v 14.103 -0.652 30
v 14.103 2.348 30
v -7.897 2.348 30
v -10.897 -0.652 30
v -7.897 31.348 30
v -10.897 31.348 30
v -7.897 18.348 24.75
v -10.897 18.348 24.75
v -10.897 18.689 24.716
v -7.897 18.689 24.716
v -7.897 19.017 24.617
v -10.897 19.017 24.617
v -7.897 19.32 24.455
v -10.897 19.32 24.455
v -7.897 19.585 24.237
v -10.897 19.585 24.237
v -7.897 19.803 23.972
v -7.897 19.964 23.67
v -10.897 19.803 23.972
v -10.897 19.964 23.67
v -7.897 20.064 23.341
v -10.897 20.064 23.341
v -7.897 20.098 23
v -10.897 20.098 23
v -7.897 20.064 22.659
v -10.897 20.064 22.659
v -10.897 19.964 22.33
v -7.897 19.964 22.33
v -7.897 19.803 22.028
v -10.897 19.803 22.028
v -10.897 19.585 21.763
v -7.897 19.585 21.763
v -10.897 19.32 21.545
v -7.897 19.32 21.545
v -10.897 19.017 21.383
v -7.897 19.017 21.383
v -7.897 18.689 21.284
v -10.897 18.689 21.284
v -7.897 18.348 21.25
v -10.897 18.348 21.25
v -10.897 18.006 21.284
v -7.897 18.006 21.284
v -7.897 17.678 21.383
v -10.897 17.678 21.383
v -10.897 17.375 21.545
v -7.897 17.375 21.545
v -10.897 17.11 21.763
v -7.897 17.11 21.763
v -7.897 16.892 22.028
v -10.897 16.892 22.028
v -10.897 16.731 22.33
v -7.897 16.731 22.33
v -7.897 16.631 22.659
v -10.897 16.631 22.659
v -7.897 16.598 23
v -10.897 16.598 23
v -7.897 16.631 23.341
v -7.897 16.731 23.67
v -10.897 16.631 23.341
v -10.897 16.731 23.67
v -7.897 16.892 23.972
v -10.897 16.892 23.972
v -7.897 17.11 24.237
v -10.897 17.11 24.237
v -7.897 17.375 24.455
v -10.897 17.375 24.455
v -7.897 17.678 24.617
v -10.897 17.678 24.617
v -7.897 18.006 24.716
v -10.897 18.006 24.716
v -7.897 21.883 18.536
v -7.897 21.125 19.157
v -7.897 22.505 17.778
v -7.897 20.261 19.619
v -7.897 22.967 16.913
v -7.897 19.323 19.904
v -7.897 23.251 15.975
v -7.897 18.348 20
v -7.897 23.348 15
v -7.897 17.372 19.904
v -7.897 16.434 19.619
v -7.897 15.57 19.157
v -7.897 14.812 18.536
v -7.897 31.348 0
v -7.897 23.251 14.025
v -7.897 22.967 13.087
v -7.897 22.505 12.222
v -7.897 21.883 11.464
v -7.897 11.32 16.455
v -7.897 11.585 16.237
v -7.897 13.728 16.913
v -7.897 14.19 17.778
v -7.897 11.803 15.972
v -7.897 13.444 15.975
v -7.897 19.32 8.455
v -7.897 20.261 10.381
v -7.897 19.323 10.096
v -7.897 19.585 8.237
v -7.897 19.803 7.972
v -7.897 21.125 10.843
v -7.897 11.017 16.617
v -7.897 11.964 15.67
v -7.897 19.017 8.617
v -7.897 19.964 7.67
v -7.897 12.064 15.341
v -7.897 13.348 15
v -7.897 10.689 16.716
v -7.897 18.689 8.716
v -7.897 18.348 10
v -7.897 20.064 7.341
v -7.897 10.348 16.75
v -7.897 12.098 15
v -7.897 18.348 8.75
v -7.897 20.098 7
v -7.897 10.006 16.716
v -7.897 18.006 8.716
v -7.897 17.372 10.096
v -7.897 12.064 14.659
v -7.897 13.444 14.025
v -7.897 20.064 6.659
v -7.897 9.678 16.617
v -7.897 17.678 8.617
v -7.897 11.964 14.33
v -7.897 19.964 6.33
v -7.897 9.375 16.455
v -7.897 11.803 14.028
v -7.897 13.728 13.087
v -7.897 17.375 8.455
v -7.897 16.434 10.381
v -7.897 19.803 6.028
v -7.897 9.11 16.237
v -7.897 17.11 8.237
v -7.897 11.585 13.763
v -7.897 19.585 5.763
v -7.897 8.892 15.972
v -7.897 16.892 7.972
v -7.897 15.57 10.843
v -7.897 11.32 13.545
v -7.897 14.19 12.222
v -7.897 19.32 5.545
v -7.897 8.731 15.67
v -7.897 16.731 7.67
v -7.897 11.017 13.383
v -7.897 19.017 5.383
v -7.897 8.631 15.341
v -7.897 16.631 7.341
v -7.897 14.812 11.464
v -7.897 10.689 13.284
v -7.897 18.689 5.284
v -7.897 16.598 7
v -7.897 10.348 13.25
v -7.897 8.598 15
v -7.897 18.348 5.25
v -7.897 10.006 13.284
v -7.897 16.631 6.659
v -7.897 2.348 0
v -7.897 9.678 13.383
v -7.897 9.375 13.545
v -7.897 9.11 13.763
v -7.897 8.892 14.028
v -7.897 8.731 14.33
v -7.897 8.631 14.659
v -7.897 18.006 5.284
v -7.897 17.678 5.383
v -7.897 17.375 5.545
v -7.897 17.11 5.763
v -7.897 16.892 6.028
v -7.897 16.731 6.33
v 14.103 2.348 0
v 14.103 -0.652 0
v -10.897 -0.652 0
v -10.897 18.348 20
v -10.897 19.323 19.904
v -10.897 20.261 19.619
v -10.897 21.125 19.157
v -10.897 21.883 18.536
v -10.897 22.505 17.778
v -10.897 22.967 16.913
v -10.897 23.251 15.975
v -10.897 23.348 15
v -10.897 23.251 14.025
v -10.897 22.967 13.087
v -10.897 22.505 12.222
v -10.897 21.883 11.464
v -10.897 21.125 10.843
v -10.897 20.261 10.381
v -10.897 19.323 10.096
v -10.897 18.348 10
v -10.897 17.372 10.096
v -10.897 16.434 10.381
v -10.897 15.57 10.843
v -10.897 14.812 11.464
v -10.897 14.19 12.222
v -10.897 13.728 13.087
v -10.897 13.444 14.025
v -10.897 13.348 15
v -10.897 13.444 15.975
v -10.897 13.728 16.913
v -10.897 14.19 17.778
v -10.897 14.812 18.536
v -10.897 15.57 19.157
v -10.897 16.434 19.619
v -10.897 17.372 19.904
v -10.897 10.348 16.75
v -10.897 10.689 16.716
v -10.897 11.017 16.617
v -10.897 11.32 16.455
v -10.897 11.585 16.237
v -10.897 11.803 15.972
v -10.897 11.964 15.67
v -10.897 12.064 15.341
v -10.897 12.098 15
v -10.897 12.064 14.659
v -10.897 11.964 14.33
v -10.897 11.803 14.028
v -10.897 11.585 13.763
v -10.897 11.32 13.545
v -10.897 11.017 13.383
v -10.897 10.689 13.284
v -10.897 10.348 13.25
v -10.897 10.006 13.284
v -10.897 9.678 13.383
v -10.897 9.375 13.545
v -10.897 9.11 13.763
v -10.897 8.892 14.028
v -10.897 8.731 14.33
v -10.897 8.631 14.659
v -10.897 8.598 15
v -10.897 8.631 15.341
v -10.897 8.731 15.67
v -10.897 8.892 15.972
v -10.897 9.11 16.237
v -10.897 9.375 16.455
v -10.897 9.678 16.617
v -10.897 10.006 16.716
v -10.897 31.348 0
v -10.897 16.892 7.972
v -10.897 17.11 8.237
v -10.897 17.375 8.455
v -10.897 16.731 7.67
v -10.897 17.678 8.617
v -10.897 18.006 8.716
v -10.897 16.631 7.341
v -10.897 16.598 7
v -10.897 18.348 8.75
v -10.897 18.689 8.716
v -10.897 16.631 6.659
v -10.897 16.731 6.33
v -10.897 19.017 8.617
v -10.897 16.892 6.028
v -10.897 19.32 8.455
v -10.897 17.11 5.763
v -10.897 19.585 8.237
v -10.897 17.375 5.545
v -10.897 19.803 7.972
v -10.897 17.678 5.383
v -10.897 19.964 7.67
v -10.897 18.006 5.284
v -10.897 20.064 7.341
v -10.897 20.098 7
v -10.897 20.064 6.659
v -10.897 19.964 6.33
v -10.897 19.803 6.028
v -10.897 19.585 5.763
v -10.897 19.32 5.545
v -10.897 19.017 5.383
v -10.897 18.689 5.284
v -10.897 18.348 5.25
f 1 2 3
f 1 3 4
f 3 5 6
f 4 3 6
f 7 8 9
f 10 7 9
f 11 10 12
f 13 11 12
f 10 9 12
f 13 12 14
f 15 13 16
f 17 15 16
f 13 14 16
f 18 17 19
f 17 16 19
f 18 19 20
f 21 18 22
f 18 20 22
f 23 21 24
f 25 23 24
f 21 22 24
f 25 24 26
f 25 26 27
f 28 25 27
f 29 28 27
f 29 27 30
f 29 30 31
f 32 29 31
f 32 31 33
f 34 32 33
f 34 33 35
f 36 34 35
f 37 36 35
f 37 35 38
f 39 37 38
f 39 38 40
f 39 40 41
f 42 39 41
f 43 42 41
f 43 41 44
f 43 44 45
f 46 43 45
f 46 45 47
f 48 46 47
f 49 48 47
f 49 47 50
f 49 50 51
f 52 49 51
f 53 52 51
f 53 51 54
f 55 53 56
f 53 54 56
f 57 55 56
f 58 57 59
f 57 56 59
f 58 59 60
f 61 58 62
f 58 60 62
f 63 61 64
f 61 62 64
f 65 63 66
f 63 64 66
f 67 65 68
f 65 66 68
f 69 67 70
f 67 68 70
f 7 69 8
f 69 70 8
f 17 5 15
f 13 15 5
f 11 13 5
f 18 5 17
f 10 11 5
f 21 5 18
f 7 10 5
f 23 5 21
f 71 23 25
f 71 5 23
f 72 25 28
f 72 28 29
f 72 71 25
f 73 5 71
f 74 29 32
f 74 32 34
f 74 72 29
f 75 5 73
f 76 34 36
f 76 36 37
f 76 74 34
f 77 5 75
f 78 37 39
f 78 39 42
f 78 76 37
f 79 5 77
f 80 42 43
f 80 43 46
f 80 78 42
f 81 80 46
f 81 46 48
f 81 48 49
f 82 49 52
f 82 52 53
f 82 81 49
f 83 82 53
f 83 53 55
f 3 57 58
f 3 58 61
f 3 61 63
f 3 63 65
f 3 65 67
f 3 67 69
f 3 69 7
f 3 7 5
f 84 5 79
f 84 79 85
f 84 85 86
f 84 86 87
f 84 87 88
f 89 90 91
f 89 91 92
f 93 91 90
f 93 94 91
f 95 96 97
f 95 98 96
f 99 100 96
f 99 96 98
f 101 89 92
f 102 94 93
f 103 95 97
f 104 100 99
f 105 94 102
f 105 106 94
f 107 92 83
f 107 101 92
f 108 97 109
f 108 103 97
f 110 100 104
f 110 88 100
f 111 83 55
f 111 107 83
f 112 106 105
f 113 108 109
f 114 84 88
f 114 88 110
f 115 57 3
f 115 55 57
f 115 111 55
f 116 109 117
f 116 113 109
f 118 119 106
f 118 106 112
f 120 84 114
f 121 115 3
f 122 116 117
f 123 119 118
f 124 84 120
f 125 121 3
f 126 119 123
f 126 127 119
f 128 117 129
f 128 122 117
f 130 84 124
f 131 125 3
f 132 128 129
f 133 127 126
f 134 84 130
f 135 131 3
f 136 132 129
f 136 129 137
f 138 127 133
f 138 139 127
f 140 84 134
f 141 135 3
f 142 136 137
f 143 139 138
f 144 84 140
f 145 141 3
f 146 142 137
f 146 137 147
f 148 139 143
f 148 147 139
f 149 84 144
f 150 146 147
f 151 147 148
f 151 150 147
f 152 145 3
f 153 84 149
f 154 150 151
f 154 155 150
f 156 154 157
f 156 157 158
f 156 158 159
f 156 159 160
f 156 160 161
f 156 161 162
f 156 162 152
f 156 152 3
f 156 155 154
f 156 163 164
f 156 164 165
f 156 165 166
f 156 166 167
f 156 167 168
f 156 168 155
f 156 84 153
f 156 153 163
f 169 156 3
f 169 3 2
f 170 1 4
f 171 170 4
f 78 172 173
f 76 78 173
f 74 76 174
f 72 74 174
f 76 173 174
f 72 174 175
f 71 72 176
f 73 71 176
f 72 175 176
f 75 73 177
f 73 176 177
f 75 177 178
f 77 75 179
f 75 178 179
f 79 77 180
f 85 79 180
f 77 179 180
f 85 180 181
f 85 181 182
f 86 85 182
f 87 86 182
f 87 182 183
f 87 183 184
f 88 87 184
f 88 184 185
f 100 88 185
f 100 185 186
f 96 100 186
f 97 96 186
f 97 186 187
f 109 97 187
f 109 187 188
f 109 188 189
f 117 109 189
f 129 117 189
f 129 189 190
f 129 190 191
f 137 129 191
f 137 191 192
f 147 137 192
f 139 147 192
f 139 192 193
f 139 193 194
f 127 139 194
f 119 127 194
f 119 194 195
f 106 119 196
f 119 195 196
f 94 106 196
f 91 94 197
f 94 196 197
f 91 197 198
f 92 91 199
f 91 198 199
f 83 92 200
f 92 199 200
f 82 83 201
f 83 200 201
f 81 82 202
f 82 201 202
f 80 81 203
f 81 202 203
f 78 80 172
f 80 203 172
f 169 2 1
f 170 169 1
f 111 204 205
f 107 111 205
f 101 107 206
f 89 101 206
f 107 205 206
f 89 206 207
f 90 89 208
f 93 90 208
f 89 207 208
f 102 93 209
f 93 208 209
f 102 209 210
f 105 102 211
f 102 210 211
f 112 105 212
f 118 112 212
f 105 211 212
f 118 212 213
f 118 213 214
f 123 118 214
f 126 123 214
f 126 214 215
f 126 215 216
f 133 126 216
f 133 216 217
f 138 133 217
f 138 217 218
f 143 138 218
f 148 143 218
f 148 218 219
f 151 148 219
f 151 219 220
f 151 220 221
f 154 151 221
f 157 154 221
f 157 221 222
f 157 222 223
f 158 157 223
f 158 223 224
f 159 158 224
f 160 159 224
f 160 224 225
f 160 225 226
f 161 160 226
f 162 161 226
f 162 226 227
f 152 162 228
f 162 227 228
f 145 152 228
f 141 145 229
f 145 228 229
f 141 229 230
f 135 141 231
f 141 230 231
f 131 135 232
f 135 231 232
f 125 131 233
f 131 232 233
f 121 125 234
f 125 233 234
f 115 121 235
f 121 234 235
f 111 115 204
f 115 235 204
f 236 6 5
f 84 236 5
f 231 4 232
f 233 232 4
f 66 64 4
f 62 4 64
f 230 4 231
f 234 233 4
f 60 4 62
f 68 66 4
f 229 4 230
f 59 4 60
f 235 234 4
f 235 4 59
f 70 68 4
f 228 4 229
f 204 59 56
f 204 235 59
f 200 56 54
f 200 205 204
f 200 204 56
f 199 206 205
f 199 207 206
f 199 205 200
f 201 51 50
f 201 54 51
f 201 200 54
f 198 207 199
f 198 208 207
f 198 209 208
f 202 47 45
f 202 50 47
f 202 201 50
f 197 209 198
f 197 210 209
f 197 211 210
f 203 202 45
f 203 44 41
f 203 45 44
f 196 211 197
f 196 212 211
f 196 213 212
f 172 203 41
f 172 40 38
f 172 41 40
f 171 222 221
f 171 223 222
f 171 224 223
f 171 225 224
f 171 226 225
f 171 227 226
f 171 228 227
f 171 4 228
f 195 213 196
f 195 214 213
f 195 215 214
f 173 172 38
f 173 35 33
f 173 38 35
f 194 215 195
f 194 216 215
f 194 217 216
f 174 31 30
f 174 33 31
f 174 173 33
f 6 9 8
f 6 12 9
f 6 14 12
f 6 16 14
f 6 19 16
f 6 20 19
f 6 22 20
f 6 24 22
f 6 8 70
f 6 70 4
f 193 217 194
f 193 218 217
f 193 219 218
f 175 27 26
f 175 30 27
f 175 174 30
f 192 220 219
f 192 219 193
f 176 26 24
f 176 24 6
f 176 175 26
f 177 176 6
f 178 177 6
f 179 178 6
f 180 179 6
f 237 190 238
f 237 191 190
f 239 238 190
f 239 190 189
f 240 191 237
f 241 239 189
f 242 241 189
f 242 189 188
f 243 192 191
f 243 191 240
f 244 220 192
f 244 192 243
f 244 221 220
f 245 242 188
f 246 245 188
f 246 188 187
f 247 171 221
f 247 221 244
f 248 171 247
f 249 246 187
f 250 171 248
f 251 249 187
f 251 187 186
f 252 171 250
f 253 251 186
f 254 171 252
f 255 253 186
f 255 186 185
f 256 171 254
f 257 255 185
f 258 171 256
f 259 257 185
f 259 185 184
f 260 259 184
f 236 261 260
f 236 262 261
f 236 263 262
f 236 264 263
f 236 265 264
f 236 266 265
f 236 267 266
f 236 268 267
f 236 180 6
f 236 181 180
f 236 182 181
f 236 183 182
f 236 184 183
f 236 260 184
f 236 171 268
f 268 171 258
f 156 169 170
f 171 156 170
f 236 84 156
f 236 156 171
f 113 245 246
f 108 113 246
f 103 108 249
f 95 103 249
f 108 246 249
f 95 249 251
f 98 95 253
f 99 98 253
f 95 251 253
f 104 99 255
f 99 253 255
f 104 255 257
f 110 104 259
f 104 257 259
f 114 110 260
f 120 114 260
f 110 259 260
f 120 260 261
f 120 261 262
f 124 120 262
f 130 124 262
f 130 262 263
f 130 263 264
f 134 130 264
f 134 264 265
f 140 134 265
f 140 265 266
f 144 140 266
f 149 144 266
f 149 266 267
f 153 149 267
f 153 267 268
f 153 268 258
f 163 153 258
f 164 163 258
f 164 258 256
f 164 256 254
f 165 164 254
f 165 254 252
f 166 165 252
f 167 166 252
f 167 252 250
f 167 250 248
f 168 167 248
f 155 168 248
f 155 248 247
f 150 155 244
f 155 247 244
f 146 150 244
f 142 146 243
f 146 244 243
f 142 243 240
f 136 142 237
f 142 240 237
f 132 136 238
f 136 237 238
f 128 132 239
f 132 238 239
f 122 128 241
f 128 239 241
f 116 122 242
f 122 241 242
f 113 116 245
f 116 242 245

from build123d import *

# Parameters (mm, degrees)
BOSS_EXTRUDE1_DEPTH            = 30
HOLE_FOR_M5_300_SC_NUTS_SP_1_D = 10
HOLE_FOR_M5_300_SC_NUTS_SP_2_D = 3.5


with BuildPart() as part:
    # Sketch1 → Boss-Extrude1 (new body)
    with BuildSketch(Plane.XY):
        Polygon((-7.897485035, 31.347562808), (-7.897485035, 2.347562808), (14.102514965, 2.347562808), (14.102514965, -0.652437192), (-10.897485035, -0.652437192), (-10.897485035, 31.347562808), align=None)
    extrude(amount=BOSS_EXTRUDE1_DEPTH)

    # Hole for M5 300® SC Nuts (SP)1 (through all)
    with Locations(Plane(origin=(-7.897485035, 0, 0), x_dir=(0, 0, -1), z_dir=(1, 0, 0))):
        with Locations((-15, 18.347562808)):
            Hole(HOLE_FOR_M5_300_SC_NUTS_SP_1_D / 2)

    # Hole for M5 300® SC Nuts (SP)2 (through all)
    with Locations(Plane(origin=(-7.897485035, 0, 0), x_dir=(0, 0, -1), z_dir=(1, 0, 0))):
        with Locations((-7, 18.347562808), (-23, 18.347562808), (-15, 10.347562808)):
            Hole(HOLE_FOR_M5_300_SC_NUTS_SP_2_D / 2)


solid = part.part
